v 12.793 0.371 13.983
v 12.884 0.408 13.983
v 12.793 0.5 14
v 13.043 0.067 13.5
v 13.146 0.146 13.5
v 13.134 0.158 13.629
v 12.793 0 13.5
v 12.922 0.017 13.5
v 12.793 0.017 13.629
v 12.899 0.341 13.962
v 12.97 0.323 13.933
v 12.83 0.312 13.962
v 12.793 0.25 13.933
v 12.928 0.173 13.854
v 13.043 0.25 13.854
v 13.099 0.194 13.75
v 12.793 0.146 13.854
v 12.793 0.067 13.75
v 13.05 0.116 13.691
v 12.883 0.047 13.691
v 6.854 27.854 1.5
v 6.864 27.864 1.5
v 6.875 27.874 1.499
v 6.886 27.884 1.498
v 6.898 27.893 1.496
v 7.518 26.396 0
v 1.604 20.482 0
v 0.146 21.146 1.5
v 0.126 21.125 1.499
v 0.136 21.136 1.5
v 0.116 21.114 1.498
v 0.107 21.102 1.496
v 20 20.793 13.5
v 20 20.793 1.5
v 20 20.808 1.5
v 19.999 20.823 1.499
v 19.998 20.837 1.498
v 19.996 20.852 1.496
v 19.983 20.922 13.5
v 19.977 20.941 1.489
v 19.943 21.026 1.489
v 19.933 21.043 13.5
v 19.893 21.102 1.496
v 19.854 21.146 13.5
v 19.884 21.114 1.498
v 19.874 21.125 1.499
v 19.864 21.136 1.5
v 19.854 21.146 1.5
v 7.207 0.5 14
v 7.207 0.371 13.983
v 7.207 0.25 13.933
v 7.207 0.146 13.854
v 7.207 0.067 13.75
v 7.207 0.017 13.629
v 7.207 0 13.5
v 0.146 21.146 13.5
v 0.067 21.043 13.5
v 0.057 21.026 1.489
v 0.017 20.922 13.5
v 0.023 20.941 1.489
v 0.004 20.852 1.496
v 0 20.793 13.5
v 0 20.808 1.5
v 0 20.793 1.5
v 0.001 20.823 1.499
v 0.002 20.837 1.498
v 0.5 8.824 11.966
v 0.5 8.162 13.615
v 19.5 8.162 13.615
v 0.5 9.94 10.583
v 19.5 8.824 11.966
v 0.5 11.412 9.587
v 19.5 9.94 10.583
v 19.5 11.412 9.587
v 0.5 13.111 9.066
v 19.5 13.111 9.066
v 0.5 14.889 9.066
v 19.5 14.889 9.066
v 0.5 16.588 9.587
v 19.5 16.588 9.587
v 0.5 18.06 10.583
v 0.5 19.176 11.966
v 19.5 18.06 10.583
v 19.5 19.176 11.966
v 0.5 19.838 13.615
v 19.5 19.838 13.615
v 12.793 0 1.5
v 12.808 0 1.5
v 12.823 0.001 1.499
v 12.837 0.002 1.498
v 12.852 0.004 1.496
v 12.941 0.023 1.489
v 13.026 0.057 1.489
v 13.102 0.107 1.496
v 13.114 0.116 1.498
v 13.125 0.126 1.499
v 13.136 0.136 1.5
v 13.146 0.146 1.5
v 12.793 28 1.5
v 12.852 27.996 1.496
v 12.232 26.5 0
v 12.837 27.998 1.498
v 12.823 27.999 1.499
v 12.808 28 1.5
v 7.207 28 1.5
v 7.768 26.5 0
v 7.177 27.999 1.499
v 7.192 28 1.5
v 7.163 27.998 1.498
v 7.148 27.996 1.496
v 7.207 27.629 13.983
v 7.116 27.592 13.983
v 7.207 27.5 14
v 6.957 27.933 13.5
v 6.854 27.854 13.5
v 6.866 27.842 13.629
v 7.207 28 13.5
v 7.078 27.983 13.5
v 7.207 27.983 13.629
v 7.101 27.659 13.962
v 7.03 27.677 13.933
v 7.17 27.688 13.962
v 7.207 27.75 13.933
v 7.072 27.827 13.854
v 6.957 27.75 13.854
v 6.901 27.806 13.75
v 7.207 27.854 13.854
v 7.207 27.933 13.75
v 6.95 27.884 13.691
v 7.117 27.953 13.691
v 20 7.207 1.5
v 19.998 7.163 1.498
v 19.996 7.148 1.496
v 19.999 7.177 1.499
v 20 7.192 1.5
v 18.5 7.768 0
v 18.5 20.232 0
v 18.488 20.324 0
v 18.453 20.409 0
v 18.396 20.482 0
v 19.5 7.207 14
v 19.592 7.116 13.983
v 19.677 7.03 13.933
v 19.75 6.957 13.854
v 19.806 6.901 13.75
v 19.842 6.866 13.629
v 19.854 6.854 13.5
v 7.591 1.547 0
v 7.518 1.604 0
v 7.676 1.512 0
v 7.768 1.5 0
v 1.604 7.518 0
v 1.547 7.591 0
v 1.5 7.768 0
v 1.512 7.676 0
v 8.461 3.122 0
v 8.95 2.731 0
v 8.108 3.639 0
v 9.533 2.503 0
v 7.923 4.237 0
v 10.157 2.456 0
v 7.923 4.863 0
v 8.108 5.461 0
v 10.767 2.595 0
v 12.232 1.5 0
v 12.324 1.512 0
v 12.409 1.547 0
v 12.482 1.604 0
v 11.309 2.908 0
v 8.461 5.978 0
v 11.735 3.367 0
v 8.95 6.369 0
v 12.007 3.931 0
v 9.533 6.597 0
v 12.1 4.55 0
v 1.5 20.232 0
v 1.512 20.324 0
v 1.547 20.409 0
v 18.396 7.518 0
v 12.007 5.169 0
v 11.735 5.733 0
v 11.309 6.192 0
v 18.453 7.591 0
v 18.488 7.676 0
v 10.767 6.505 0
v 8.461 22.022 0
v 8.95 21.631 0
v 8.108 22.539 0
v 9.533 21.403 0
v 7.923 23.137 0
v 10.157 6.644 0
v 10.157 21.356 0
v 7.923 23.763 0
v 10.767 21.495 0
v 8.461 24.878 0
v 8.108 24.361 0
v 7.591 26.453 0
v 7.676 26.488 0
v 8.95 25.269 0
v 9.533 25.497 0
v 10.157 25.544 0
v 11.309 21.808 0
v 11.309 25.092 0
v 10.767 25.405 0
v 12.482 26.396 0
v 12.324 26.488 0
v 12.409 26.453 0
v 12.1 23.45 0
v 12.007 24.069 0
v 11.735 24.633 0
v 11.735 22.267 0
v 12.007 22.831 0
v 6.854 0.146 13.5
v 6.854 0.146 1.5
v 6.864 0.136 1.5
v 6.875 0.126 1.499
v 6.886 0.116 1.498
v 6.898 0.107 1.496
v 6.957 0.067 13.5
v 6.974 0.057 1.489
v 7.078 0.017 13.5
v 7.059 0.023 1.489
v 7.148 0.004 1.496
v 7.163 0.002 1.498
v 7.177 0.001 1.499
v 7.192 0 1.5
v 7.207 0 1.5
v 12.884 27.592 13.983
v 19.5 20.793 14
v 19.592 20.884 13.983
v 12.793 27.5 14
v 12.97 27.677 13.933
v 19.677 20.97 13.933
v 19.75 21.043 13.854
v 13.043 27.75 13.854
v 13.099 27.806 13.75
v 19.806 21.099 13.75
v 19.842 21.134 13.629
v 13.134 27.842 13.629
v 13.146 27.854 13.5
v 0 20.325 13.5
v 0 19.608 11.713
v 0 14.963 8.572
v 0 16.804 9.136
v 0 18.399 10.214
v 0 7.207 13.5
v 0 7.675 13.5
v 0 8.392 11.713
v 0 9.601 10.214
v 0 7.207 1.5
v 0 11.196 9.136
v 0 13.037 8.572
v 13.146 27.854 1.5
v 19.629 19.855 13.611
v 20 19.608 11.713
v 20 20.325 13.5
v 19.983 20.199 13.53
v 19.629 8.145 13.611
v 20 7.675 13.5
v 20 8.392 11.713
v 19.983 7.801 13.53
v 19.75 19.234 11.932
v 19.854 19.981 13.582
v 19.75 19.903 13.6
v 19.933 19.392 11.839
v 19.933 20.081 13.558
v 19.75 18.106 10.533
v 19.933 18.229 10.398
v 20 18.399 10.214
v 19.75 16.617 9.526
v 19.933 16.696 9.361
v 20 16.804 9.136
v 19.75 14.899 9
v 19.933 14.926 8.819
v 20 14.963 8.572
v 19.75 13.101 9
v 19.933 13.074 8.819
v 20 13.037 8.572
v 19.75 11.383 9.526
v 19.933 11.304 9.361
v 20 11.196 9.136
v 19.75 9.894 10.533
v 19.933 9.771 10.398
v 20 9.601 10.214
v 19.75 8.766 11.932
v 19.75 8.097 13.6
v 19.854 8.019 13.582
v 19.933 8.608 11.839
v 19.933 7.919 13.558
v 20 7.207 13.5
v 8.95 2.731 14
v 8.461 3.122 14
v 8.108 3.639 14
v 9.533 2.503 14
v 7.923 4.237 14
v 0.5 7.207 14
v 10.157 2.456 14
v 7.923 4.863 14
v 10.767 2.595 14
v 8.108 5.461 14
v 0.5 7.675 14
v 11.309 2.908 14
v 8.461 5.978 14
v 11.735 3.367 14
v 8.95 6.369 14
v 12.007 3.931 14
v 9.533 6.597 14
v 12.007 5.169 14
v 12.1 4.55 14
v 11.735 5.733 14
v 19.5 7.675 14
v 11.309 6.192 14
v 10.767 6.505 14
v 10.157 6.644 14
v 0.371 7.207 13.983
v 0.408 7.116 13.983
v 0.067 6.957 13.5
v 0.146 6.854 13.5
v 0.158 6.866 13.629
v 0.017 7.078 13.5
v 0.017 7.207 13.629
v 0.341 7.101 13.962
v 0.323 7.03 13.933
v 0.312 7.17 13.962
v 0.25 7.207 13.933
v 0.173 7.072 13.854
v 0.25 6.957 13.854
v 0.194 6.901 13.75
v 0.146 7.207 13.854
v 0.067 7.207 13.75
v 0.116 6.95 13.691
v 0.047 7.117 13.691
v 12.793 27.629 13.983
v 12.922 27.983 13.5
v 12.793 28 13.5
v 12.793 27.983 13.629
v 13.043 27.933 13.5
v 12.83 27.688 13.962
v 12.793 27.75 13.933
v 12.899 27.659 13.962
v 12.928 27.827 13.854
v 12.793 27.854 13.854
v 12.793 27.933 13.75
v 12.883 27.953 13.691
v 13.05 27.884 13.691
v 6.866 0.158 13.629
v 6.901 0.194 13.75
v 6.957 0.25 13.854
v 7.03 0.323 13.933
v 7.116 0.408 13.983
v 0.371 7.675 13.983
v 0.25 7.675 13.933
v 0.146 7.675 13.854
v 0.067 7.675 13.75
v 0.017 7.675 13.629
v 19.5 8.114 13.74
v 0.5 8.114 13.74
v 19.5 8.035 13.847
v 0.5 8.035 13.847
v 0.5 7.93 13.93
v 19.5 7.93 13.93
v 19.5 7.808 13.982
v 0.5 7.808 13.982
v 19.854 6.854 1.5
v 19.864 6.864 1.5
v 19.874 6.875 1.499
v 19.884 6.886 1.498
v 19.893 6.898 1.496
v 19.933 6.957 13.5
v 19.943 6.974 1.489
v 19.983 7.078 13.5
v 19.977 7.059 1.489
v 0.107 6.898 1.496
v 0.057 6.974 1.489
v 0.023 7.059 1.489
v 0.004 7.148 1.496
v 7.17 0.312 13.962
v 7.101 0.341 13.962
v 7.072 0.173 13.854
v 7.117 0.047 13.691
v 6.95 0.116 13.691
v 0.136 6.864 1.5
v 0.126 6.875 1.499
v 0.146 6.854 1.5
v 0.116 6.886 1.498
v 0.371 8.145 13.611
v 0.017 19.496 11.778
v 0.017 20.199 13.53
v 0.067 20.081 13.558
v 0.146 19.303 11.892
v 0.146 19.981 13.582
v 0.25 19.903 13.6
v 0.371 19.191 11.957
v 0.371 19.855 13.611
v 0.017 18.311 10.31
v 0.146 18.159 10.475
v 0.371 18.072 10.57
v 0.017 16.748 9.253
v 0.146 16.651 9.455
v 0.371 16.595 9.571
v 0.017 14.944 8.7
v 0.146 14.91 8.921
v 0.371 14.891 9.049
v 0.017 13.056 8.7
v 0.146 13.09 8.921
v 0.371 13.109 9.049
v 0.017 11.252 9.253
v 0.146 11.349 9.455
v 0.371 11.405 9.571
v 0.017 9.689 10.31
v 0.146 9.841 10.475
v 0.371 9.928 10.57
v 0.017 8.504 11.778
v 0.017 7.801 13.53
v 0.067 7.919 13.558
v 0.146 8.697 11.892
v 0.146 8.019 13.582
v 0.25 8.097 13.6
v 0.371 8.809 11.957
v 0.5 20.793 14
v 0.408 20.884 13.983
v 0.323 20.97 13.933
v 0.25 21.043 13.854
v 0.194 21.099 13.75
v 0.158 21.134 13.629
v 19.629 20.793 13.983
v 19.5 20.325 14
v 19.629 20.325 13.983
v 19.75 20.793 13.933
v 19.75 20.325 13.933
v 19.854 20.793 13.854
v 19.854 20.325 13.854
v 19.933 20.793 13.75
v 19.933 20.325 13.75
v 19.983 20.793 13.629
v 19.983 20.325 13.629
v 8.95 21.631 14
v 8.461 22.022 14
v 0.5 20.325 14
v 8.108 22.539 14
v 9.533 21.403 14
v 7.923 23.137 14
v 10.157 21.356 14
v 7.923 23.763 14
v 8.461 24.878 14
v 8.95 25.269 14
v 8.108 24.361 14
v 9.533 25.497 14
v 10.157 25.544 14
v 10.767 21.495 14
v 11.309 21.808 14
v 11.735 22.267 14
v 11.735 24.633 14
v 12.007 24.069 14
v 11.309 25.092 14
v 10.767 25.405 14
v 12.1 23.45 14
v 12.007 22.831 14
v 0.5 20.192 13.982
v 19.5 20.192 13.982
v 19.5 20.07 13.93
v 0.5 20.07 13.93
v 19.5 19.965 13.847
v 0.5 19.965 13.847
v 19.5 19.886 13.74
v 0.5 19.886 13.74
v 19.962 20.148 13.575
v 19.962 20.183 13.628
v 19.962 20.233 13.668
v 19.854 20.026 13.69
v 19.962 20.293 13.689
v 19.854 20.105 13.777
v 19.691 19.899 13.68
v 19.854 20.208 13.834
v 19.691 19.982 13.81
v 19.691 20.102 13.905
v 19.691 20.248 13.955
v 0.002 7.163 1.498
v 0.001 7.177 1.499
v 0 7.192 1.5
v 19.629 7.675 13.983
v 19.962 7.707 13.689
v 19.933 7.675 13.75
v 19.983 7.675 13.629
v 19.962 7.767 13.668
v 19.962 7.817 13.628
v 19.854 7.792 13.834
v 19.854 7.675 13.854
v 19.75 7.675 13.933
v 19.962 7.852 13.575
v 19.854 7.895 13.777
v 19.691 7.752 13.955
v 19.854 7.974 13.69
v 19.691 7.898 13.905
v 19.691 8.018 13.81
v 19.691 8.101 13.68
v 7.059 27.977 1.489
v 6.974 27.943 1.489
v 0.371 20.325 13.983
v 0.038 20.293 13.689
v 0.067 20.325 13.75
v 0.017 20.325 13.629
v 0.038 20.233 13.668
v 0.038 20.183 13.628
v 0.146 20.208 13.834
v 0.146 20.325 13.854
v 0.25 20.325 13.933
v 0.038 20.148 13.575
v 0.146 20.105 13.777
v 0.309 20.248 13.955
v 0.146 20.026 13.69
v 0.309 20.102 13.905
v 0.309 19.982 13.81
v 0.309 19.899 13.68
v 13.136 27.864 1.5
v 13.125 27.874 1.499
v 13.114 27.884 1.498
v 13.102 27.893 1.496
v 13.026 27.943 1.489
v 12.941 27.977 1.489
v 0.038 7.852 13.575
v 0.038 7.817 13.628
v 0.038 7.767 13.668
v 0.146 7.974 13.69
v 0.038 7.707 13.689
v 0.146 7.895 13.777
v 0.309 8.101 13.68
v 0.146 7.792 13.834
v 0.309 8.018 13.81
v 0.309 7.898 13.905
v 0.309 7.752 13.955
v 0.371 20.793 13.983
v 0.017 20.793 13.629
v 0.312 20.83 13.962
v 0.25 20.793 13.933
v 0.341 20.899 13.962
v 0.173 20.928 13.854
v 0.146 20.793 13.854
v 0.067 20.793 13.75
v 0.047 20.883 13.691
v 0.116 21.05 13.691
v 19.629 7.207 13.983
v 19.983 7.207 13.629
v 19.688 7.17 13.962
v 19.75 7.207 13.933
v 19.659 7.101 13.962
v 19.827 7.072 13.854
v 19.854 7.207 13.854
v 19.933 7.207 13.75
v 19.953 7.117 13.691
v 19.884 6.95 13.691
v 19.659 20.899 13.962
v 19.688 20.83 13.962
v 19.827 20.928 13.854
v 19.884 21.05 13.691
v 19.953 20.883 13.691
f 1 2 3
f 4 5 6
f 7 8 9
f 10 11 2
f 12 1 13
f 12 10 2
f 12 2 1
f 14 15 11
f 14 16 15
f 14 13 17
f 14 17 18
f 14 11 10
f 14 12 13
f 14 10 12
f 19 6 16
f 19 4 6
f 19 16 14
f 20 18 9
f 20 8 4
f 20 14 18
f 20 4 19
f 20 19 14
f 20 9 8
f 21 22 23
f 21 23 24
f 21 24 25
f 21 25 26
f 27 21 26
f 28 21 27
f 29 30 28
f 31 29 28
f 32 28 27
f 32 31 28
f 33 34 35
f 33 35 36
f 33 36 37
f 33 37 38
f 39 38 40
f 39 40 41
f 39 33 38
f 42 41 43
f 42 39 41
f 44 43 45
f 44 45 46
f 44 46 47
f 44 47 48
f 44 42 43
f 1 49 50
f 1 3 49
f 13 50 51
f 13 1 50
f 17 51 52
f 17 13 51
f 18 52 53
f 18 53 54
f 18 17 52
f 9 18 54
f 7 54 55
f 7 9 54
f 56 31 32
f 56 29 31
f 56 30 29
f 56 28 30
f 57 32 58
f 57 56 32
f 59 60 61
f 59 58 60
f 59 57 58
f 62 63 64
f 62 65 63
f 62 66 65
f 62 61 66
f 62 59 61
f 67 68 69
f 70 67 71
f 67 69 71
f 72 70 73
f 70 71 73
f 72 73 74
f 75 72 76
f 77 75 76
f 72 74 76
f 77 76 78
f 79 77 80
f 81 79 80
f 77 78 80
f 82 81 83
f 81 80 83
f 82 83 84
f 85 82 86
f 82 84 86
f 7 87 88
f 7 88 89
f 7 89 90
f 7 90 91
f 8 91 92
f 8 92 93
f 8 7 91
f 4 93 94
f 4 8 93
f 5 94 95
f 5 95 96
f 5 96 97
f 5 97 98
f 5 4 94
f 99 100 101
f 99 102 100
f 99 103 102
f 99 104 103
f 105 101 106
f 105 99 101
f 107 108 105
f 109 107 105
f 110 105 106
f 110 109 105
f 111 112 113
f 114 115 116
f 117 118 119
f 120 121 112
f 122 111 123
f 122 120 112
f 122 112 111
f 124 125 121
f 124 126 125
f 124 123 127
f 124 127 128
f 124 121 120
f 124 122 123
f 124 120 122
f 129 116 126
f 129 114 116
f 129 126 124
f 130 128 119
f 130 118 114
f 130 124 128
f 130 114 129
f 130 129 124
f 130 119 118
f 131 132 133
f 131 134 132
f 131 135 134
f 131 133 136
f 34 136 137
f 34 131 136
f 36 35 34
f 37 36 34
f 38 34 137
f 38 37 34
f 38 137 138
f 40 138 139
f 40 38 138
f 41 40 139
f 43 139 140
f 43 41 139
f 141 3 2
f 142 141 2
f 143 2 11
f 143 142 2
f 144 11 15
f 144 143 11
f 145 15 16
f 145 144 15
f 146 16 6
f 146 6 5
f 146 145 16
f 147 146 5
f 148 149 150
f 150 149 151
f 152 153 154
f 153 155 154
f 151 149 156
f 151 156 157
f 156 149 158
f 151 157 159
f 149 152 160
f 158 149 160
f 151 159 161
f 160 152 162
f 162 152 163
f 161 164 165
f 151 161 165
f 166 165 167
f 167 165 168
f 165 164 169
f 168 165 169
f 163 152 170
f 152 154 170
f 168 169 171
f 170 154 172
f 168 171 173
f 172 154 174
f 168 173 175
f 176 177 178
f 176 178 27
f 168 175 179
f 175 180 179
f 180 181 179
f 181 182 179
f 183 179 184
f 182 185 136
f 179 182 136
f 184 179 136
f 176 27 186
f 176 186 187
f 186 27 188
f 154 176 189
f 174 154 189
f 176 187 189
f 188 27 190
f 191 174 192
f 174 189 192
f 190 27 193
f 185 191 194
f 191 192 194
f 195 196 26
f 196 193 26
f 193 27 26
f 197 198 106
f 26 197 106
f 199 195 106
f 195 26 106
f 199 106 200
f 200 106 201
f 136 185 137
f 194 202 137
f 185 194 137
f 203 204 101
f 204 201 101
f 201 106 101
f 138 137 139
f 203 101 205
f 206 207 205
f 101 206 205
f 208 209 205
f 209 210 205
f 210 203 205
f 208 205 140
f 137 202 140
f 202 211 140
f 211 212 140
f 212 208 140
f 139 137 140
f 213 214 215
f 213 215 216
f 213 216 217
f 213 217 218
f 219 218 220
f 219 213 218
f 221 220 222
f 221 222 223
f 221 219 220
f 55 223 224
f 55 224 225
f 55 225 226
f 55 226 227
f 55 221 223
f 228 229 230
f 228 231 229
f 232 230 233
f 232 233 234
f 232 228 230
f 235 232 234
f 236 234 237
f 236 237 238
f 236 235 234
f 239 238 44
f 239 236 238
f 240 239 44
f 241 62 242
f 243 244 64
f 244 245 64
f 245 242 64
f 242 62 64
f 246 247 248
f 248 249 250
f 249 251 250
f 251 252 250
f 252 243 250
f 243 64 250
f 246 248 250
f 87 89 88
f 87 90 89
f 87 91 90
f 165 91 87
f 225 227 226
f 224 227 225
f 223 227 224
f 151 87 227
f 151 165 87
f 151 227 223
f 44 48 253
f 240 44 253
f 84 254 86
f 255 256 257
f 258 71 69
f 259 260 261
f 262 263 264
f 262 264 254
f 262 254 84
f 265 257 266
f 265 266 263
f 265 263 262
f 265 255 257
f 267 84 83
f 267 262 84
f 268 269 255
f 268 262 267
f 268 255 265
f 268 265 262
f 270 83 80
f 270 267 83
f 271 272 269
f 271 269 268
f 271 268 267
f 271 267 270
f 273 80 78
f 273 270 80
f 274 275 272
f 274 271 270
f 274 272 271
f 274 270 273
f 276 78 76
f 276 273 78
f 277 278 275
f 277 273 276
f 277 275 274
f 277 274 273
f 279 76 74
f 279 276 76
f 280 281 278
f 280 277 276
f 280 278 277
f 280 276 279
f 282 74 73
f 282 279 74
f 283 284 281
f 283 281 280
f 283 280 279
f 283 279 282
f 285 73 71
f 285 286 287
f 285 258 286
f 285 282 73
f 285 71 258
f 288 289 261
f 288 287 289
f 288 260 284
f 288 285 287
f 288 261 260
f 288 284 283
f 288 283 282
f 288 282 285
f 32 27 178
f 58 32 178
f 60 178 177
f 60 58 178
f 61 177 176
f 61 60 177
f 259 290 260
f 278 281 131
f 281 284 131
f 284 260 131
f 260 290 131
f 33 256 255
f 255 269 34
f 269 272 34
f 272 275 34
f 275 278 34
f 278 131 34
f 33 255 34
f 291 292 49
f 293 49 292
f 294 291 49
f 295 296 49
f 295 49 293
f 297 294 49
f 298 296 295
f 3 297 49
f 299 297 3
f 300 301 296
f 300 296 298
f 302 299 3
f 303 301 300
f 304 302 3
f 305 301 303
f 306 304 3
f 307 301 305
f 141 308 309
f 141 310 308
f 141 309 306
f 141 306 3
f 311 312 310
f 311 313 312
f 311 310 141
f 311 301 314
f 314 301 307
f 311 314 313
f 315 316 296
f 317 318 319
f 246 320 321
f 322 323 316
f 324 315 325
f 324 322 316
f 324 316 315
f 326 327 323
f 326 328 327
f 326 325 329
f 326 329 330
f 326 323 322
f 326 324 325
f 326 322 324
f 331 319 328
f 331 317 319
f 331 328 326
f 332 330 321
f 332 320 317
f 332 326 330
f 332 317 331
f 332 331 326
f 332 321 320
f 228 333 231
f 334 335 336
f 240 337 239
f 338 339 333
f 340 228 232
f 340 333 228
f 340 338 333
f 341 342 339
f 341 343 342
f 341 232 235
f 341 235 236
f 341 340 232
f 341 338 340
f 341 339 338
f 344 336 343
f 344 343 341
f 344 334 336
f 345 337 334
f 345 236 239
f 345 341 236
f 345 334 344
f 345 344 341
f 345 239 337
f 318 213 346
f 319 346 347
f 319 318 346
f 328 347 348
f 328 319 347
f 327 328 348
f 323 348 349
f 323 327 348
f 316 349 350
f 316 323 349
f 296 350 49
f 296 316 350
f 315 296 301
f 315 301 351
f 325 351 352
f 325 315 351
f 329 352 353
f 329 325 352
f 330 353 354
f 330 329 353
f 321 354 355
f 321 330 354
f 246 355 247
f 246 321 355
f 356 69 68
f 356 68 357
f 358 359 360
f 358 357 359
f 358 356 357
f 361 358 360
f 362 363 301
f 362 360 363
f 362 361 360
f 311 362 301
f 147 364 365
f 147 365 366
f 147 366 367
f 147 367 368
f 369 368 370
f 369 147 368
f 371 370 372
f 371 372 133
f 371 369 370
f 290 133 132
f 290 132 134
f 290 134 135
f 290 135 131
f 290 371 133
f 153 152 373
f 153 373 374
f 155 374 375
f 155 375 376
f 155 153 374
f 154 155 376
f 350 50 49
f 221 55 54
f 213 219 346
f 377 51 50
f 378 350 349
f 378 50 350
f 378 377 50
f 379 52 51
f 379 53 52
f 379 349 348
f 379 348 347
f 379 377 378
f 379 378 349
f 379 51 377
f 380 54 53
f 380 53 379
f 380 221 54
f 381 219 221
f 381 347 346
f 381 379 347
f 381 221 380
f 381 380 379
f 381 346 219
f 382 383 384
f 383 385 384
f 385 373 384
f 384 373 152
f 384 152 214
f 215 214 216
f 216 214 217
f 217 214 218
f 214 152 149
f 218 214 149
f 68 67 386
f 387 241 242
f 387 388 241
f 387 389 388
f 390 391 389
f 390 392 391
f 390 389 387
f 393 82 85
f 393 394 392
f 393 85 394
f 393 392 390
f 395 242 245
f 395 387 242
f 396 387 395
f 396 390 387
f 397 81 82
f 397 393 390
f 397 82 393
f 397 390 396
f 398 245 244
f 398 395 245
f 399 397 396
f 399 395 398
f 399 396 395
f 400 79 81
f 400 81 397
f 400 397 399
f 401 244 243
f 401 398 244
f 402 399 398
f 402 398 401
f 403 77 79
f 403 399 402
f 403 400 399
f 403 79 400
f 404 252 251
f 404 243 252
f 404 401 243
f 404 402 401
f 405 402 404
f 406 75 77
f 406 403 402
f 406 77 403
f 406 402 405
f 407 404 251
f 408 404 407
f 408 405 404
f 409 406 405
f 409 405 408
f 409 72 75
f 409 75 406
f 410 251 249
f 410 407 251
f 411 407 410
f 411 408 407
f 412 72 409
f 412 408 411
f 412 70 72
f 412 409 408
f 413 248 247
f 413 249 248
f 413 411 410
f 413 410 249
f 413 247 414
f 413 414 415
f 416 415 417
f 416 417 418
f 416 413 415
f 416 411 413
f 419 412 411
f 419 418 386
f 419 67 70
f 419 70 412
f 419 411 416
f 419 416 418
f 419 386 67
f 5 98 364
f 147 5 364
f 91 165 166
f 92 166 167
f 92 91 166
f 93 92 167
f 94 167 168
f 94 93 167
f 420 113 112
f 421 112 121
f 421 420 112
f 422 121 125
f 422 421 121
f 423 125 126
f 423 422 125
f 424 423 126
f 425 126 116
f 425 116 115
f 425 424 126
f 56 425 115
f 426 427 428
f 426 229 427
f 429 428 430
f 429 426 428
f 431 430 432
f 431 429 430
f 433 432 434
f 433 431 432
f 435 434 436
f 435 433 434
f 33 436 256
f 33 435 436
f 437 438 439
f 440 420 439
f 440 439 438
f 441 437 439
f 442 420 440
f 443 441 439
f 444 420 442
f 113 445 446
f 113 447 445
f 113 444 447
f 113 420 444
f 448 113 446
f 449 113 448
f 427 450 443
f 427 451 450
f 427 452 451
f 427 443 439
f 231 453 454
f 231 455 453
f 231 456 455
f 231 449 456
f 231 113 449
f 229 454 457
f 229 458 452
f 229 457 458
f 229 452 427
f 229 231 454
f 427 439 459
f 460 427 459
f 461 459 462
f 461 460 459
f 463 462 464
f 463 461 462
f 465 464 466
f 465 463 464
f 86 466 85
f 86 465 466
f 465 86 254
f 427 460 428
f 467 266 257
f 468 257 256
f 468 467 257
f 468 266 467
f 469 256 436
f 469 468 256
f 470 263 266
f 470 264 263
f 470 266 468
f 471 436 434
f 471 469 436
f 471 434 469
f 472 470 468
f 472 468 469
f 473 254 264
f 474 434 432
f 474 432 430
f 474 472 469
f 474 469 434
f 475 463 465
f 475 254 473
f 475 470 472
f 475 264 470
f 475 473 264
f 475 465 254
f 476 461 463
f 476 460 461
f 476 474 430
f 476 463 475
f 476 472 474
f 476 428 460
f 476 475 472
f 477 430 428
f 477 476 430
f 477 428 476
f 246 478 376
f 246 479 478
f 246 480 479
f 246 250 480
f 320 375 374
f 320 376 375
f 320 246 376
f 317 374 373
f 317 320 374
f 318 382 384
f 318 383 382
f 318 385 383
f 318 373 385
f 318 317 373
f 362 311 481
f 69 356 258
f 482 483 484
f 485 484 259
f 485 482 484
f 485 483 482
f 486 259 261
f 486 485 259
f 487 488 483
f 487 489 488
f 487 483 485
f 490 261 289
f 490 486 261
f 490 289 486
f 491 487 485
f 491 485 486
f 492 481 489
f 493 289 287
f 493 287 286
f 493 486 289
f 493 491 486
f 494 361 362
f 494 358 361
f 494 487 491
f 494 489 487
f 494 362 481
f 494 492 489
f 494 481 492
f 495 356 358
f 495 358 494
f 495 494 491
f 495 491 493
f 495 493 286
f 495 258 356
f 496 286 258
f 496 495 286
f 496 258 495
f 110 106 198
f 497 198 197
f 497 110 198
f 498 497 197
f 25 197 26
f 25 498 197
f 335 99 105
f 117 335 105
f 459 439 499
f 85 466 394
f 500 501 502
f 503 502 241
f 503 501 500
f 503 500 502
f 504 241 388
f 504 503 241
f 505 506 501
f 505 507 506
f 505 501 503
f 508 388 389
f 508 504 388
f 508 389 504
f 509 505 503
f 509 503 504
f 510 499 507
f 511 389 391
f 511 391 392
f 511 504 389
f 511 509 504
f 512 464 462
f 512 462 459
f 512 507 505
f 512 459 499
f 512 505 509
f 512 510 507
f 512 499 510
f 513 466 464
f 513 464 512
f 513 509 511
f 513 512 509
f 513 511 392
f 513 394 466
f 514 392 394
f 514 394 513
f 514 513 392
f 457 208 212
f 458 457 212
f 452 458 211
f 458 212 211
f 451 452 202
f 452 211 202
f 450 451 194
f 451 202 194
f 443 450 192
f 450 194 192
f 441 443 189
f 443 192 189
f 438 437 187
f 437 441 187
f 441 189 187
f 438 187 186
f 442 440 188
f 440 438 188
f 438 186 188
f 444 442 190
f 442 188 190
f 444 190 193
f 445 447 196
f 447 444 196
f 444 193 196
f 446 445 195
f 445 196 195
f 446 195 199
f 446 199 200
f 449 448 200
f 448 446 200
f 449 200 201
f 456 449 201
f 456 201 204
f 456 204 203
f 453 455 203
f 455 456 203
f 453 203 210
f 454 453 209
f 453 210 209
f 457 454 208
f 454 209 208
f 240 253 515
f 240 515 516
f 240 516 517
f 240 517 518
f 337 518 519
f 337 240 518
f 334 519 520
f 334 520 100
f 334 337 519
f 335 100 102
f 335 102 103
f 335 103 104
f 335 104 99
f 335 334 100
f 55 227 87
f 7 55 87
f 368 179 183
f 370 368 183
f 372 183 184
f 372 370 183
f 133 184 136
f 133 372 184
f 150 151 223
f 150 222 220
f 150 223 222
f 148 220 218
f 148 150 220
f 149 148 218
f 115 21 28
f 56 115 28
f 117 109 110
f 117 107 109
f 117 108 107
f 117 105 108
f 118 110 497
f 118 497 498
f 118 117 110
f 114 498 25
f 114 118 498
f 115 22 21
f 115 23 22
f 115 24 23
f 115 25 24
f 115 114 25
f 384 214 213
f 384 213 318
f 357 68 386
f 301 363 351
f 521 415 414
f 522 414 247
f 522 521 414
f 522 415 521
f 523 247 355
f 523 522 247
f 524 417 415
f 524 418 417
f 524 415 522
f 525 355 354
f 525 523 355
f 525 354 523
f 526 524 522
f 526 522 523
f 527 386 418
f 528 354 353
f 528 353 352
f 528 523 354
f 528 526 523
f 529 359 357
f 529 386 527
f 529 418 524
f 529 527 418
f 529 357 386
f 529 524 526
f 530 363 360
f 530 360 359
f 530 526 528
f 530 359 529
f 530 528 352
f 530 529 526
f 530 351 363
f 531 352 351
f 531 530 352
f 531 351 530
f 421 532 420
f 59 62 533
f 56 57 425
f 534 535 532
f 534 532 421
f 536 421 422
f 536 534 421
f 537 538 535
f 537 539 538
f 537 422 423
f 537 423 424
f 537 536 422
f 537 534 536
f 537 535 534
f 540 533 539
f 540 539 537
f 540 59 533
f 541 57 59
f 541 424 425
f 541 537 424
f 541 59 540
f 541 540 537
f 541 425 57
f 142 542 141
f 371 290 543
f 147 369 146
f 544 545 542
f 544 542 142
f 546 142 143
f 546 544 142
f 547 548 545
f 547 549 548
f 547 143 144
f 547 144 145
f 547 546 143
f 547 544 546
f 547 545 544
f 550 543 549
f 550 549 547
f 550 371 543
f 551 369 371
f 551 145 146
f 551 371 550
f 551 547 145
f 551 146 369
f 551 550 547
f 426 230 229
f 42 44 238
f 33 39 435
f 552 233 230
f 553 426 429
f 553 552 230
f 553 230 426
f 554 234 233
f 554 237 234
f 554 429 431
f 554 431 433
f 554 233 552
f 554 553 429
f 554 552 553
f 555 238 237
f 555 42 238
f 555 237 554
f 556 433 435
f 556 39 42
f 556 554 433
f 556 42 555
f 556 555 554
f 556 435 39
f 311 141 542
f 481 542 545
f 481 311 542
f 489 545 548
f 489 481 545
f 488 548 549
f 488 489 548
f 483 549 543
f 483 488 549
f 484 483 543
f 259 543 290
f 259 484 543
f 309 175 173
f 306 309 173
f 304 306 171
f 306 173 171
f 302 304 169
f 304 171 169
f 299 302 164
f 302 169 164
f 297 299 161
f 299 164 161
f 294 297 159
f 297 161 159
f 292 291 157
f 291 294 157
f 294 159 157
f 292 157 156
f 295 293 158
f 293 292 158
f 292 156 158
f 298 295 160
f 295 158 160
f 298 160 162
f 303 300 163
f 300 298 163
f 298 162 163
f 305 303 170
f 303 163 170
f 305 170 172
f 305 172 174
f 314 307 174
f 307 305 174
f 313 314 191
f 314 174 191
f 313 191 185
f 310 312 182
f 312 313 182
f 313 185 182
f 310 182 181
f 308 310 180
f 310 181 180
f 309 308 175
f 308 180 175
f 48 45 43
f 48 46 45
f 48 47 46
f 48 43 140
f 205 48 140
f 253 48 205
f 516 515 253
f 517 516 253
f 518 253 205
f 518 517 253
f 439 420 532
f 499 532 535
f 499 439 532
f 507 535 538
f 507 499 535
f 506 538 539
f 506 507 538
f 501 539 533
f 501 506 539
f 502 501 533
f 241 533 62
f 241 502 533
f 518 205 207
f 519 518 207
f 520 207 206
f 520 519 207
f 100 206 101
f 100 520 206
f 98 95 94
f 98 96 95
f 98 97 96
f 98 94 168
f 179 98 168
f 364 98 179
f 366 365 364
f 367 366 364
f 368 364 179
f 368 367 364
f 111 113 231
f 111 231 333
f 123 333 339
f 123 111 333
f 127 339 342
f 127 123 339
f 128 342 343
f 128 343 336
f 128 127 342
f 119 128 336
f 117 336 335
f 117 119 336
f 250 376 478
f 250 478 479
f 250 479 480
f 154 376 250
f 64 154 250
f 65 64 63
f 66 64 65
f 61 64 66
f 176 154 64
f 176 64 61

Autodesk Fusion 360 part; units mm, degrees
sketch "Esquisse1" plane through (0, 0, 0) normal (0, 0, 1) x (1, 0, 0)
  line L0 (7, 0) -> (13, 0)
  line L1 (20, 7) -> (20, 21)
  line L2 (13, 28) -> (7, 28)
  line L3 (0, 21) -> (0, 7)
  line L4 (10, 28) -> (10, 0) construction
  circle A0 centre (10, 23.45) radius 2.1
  circle A1 centre (10, 4.55) radius 2.1
  line L5 (-6, 20) -> (25, 20) construction
  line L6 (25, 20) -> (25, 8) construction
  line L7 (25, 8) -> (-6, 8) construction
  line L8 (-6, 8) -> (-6, 20) construction
  line L9 (13, 0) -> (20, 7)
  line L10 (7, 0) -> (0, 7)
  line L11 (20, 21) -> (13, 28)
  line L12 (7, 28) -> (0, 21)
  point P0 (20, 0)
  point P1 (20, 28)
  point P2 (0, 28)
  dimension "d1" = 20
  dimension "d2" = 28
  dimension "d3" = 4.2
  dimension "d4" = 4.2
  dimension "d5" = 18.9
  dimension "d6" = 4.55
  dimension "d7" = 12
  dimension "d8" = 8
  dimension "d9" = 7
  dimension "d10" = 7
  dimension "d11" = 7
  dimension "d12" = 7
  dimension "d13" = 7
  dimension "d14" = 7
  dimension "d15" = 7
  dimension "d16" = 7
extrude "Extrusion1" add sketch "Esquisse1" along normal blind 14
sketch "Esquisse2" plane through (20, 0, 0) normal (1, 0, 0) x (0, 1, 0)
  line L0 (7, 0) -> (21, 0)
  line L1 (21, 0) -> (21, 14)
  line L2 (21, 14) -> (7, 14)
  line L3 (7, 14) -> (7, 0)
  circle A0 centre (14, 15) radius 6
  dimension "d19" = 12
  dimension "d20" = 15
  dimension "d21" = 7
extrude "Extrusion2" cut sketch "Esquisse2" against normal blind 20 contours L2 A0 | L2 A0
chamfer "Chanfrein1" distance 1.5 angle 45 8 edges at (16.5, 3.5, 0) (20, 14, 0) (16.5, 24.5, 0) (10, 28, 0) (3.5, 24.5, 0) (0, 14, 0) (3.5, 3.5, 0) (10, 0, 0)
fillet "Congé1" radius 0.5 22 edges at (10, 8.0839, 14) (10, 19.9161, 14) (0, 21, 7.75) (0, 7, 7.75) (0, 7.542, 14) (7, 0, 7.75) (13, 0, 7.75) (20, 7, 7.75) (20, 7.542, 14) (20, 14, 9) (0, 14, 9) (3.5, 24.5, 14) (10, 28, 14) (16.5, 24.5, 14) (20, 20.458, 14) (0, 20.458, 14) (20, 21, 7.75) (13, 28, 7.75) (7, 28, 7.75) (16.5, 3.5, 14) (10, 0, 14) (3.5, 3.5, 14)
fillet "Congé2" radius 0.5 8 edges at (0.769, 7.3185, 0.731) (7.3185, 0.769, 0.731) (12.6815, 0.769, 0.731) (0.769, 20.6815, 0.731) (7.3185, 27.231, 0.731) (12.6815, 27.231, 0.731) (19.231, 20.6815, 0.731) (19.231, 7.3185, 0.731)
equation "d5 = 14.7 mm + 4.2 mm"
equation "d6 = ( ( 28 - 18.9 ) / 2 ) * 1 mm"
equation "d10 = d9"
equation "d12 = d11"
equation "d14 = d13"
equation "d16 = d15"
